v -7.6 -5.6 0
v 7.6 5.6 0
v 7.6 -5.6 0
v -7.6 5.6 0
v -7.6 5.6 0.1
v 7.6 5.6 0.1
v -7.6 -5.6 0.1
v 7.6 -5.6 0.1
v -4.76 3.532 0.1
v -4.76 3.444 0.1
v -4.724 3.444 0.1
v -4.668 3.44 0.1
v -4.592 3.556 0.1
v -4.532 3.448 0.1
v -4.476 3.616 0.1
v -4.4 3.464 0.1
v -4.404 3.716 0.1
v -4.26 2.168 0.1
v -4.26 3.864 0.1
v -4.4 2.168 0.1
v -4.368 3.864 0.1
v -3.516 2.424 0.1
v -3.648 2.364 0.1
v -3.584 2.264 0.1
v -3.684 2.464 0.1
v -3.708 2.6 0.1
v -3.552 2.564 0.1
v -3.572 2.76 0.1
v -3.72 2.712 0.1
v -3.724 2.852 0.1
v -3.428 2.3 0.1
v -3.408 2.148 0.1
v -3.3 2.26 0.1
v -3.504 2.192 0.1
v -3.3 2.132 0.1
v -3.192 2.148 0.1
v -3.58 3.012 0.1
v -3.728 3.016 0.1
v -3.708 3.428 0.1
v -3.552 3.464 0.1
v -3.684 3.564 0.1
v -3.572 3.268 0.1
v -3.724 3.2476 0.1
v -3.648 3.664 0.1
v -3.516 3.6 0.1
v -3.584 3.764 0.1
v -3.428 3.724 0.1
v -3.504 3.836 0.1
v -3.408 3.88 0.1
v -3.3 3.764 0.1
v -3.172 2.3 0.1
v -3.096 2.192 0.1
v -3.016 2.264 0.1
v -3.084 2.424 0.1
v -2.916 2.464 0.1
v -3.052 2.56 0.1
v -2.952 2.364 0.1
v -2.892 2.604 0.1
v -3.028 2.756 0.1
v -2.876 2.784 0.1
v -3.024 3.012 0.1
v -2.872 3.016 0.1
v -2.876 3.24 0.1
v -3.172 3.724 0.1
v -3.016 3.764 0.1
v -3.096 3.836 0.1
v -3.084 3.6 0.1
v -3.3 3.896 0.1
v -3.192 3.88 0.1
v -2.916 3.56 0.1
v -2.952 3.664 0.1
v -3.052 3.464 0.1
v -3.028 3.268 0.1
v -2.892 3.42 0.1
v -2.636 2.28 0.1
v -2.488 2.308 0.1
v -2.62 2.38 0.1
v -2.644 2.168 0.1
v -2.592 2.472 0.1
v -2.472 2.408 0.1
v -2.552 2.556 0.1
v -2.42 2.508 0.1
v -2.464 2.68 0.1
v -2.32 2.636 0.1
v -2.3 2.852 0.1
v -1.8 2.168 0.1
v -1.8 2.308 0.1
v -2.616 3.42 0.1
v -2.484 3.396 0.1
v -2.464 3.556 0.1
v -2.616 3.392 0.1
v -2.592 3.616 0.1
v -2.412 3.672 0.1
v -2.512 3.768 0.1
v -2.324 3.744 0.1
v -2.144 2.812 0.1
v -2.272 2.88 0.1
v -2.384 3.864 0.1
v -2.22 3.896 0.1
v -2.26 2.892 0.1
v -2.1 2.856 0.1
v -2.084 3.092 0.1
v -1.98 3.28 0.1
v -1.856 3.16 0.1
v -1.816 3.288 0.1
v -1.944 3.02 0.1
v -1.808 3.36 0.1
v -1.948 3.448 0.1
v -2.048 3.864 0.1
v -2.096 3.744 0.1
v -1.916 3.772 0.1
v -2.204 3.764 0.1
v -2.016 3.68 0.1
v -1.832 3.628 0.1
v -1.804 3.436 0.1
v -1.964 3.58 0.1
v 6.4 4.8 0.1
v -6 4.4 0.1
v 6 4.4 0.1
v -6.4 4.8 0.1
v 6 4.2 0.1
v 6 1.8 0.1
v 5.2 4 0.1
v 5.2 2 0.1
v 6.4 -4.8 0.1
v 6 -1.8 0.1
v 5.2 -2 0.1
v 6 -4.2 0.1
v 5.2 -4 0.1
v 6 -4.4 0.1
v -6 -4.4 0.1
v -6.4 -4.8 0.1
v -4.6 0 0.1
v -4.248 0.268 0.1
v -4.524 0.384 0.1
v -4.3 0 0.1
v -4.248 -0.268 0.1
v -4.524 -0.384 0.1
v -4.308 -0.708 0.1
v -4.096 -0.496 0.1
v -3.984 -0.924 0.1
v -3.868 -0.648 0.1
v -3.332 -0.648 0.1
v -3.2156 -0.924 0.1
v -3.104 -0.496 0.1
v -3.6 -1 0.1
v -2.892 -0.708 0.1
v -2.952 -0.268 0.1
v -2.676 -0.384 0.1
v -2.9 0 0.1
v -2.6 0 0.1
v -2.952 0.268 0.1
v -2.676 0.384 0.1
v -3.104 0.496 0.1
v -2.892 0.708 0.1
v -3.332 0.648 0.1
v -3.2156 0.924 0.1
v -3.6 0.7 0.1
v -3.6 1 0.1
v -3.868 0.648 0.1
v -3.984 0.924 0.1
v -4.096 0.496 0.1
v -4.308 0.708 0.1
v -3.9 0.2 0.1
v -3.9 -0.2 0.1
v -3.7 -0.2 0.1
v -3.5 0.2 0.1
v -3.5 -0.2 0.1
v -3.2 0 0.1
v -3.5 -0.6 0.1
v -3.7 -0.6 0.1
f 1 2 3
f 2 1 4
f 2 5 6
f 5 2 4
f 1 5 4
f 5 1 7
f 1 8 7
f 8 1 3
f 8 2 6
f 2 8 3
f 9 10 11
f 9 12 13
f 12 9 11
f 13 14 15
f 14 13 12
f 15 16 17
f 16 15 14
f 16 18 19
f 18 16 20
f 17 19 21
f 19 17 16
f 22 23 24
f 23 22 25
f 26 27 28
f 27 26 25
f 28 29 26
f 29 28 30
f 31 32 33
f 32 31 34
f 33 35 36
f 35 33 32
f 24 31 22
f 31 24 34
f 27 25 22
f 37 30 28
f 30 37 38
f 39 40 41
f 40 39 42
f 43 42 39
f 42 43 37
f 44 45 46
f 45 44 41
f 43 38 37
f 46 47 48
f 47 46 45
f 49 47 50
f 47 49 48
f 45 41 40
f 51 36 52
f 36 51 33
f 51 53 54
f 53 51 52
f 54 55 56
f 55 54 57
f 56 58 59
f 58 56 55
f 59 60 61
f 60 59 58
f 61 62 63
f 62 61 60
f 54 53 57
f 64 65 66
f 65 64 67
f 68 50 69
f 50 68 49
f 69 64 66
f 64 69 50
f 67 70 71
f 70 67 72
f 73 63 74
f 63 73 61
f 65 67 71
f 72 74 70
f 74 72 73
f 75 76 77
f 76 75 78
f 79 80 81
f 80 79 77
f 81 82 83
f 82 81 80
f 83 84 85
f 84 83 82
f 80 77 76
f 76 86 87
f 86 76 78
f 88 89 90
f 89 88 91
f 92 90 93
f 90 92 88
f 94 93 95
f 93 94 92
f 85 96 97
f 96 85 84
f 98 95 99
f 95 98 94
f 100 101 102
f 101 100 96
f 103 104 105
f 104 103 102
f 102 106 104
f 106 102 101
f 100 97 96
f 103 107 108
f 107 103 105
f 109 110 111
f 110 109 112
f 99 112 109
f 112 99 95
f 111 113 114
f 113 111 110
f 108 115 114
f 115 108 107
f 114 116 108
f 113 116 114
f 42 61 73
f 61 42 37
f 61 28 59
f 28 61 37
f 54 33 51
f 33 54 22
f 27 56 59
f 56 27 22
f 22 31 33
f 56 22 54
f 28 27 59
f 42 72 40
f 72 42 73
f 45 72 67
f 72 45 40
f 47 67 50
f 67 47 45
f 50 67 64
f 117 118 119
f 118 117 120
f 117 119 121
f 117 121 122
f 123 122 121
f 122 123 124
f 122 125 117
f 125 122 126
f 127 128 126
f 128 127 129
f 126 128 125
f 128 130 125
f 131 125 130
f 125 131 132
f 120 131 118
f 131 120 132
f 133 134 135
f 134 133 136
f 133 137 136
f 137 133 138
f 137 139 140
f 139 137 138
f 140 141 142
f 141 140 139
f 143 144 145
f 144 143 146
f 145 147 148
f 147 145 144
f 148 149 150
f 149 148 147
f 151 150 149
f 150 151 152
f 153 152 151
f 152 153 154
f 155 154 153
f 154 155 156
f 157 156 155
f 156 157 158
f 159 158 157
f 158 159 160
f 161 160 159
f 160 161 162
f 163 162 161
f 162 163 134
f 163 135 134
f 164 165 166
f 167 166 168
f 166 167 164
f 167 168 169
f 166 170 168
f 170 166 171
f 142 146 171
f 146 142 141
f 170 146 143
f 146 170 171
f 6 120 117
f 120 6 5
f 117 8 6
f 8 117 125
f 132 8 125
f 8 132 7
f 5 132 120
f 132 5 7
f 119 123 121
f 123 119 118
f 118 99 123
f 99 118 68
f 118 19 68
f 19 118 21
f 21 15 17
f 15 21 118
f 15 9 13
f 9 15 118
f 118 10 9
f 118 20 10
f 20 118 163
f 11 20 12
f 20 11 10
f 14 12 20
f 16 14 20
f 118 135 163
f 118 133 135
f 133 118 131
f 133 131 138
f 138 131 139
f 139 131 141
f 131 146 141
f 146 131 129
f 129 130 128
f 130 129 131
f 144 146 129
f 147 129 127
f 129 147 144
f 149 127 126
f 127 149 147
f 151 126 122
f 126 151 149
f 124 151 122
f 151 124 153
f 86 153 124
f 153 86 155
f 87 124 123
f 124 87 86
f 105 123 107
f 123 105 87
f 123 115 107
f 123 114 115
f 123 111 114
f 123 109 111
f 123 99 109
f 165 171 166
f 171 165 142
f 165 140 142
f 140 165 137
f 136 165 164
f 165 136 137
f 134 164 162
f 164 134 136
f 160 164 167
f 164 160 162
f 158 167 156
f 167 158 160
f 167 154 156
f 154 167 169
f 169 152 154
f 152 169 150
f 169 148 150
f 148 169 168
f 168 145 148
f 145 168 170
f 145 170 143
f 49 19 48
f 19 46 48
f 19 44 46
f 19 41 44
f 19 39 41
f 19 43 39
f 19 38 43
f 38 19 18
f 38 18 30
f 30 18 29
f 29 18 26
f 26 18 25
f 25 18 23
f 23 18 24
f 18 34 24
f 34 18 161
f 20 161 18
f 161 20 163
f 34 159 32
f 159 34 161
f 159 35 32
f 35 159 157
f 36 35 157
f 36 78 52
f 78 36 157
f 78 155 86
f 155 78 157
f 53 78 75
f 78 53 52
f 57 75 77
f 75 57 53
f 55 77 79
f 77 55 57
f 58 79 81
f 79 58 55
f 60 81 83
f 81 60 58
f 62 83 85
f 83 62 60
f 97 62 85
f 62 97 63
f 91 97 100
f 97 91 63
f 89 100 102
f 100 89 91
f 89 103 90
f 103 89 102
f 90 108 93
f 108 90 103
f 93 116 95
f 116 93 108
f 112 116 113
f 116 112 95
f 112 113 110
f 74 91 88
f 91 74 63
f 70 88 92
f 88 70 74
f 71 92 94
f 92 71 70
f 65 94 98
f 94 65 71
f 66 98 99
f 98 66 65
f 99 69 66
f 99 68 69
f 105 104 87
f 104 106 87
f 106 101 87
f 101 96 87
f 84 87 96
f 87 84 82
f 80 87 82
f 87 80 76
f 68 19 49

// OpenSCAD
// file: ../p/box5-12.scad
use <../lib.scad>
function ldraw_lib__box5_12() = [
// 0 Box with 5 Faces without Any Edges
// 0 Name: box5-12.dat
// 0 Author: Chris Dee [cwdee]
// 0 !LDRAW_ORG Primitive UPDATE 2009-02
// 0 !LICENSE Licensed under CC BY 4.0 : see CAreadme.txt
// 
// 0 BFC CERTIFY CCW
  [0,"BFC","CERTIFY"],
  [0,"BFC","CCW"],
// 
// 0 !HISTORY 2009-09-03 [PTadmin] Official Update 2009-02
// 
// 
// 4 16 1 1 1 1 1 -1 -1 1 -1 -1 1 1
  [4,16,1,1,1,1,1,-1,-1,1,-1,-1,1,1],
// 4 16 -1 0 1 1 0 1 1 1 1 -1 1 1
  [4,16,-1,0,1,1,0,1,1,1,1,-1,1,1],
// 4 16 -1 0 -1 -1 0 1 -1 1 1 -1 1 -1
  [4,16,-1,0,-1,-1,0,1,-1,1,1,-1,1,-1],
// 4 16 1 0 -1 -1 0 -1 -1 1 -1 1 1 -1
  [4,16,1,0,-1,-1,0,-1,-1,1,-1,1,1,-1],
// 4 16 1 0 1 1 0 -1 1 1 -1 1 1 1
  [4,16,1,0,1,1,0,-1,1,1,-1,1,1,1],
// 0
];
module ldraw_lib__box5_12(step=0, col=false, unit=2/5, alt=false, line=0.2, solid=!$preview)
    makepoly(ldraw_lib__box5_12(), step=step, col=col, unit=unit, alt=alt, line=line, solid=solid);
ldraw_lib__box5_12(line=0.2);
// main file
use <../lib.scad>
use <../p/box5-12.scad>
function ldraw_lib__163156b() = [
// 0 Sticker  1.4 x  1.9 with Town Airport Lockers - 102 Lock
// 0 Name: 163156b.dat
// 0 Author: Takeshi Takahashi [RainbowDolphin]
// 0 !LDRAW_ORG Part UPDATE 2020-03
// 0 !LICENSE Licensed under CC BY 4.0 : see CAreadme.txt
// 
// 0 BFC CERTIFY CCW
  [0,"BFC","CERTIFY"],
  [0,"BFC","CCW"],
// 
// 0 !KEYWORDS set 6396
// 
// 0 !HISTORY 2018-01-08 [bercik] OMR version by Robert Paciorek [bercik] with permission of Zoltank82
// 0 !HISTORY 2020-06-24 [RainbowDolphin] File preparation for LDraw Parts Tracker
// 0 !HISTORY 2020-12-29 [PTadmin] Official Update 2020-03
// 
// 
// 1 16 0 -0.25 0 19 0 0 0 0.25 0 0 0 14 box5-12.dat
  [1,16,0,-0.25,0,19,0,0,0,0.25,0,0,0,14, ldraw_lib__box5_12()],
// 3 0 -11.9 -0.25 8.83 -11.9 -0.25 8.61 -11.81 -0.25 8.61
  [3,0,-11.9,-0.25,8.83,-11.9,-0.25,8.61,-11.81,-0.25,8.61],
// 4 0 -11.9 -0.25 8.83 -11.81 -0.25 8.61 -11.67 -0.25 8.6 -11.48 -0.25 8.89
  [4,0,-11.9,-0.25,8.83,-11.81,-0.25,8.61,-11.67,-0.25,8.6,-11.48,-0.25,8.89],
// 4 0 -11.48 -0.25 8.89 -11.67 -0.25 8.6 -11.33 -0.25 8.62 -11.19 -0.25 9.04
  [4,0,-11.48,-0.25,8.89,-11.67,-0.25,8.6,-11.33,-0.25,8.62,-11.19,-0.25,9.04],
// 4 0 -11.19 -0.25 9.04 -11.33 -0.25 8.62 -11 -0.25 8.66 -11.01 -0.25 9.29
  [4,0,-11.19,-0.25,9.04,-11.33,-0.25,8.62,-11,-0.25,8.66,-11.01,-0.25,9.29],
// 4 0 -11 -0.25 8.66 -11 -0.25 5.42 -10.65 -0.25 5.42 -10.65 -0.25 9.66
  [4,0,-11,-0.25,8.66,-11,-0.25,5.42,-10.65,-0.25,5.42,-10.65,-0.25,9.66],
// 4 0 -11.01 -0.25 9.29 -11 -0.25 8.66 -10.65 -0.25 9.66 -10.92 -0.25 9.66
  [4,0,-11.01,-0.25,9.29,-11,-0.25,8.66,-10.65,-0.25,9.66,-10.92,-0.25,9.66],
// 4 0 -8.79 -0.25 6.06 -9.21 -0.25 6.16 -9.12 -0.25 5.91 -8.96 -0.25 5.66
  [4,0,-8.79,-0.25,6.06,-9.21,-0.25,6.16,-9.12,-0.25,5.91,-8.96,-0.25,5.66],
// 4 0 -9.27 -0.25 6.5 -9.21 -0.25 6.16 -8.88 -0.25 6.41 -8.93 -0.25 6.9
  [4,0,-9.27,-0.25,6.5,-9.21,-0.25,6.16,-8.88,-0.25,6.41,-8.93,-0.25,6.9],
// 4 0 -9.3 -0.25 6.78 -9.27 -0.25 6.5 -8.93 -0.25 6.9 -9.31 -0.25 7.13
  [4,0,-9.3,-0.25,6.78,-9.27,-0.25,6.5,-8.93,-0.25,6.9,-9.31,-0.25,7.13],
// 4 0 -8.57 -0.25 5.75 -8.76 -0.25 5.48 -8.52 -0.25 5.37 -8.25 -0.25 5.65
  [4,0,-8.57,-0.25,5.75,-8.76,-0.25,5.48,-8.52,-0.25,5.37,-8.25,-0.25,5.65],
// 4 0 -8.25 -0.25 5.65 -8.52 -0.25 5.37 -8.25 -0.25 5.33 -7.98 -0.25 5.37
  [4,0,-8.25,-0.25,5.65,-8.52,-0.25,5.37,-8.25,-0.25,5.33,-7.98,-0.25,5.37],
// 4 0 -8.57 -0.25 5.75 -8.79 -0.25 6.06 -8.96 -0.25 5.66 -8.76 -0.25 5.48
  [4,0,-8.57,-0.25,5.75,-8.79,-0.25,6.06,-8.96,-0.25,5.66,-8.76,-0.25,5.48],
// 3 0 -8.88 -0.25 6.41 -9.21 -0.25 6.16 -8.79 -0.25 6.06
  [3,0,-8.88,-0.25,6.41,-9.21,-0.25,6.16,-8.79,-0.25,6.06],
// 4 0 -9.31 -0.25 7.13 -8.93 -0.25 6.9 -8.95 -0.25 7.53 -9.32 -0.25 7.54
  [4,0,-9.31,-0.25,7.13,-8.93,-0.25,6.9,-8.95,-0.25,7.53,-9.32,-0.25,7.54],
// 4 0 -8.88 -0.25 8.66 -9.21 -0.25 8.91 -9.27 -0.25 8.57 -8.93 -0.25 8.17
  [4,0,-8.88,-0.25,8.66,-9.21,-0.25,8.91,-9.27,-0.25,8.57,-8.93,-0.25,8.17],
// 4 0 -8.93 -0.25 8.17 -9.27 -0.25 8.57 -9.31 -0.25 8.119 -8.95 -0.25 7.53
  [4,0,-8.93,-0.25,8.17,-9.27,-0.25,8.57,-9.31,-0.25,8.119,-8.95,-0.25,7.53],
// 4 0 -8.79 -0.25 9 -8.96 -0.25 9.41 -9.12 -0.25 9.16 -9.21 -0.25 8.91
  [4,0,-8.79,-0.25,9,-8.96,-0.25,9.41,-9.12,-0.25,9.16,-9.21,-0.25,8.91],
// 3 0 -9.31 -0.25 8.119 -9.32 -0.25 7.54 -8.95 -0.25 7.53
  [3,0,-9.31,-0.25,8.119,-9.32,-0.25,7.54,-8.95,-0.25,7.53],
// 4 0 -8.96 -0.25 9.41 -8.79 -0.25 9 -8.57 -0.25 9.31 -8.76 -0.25 9.59
  [4,0,-8.96,-0.25,9.41,-8.79,-0.25,9,-8.57,-0.25,9.31,-8.76,-0.25,9.59],
// 4 0 -8.52 -0.25 9.7 -8.76 -0.25 9.59 -8.57 -0.25 9.31 -8.25 -0.25 9.41
  [4,0,-8.52,-0.25,9.7,-8.76,-0.25,9.59,-8.57,-0.25,9.31,-8.25,-0.25,9.41],
// 3 0 -8.79 -0.25 9 -9.21 -0.25 8.91 -8.88 -0.25 8.66
  [3,0,-8.79,-0.25,9,-9.21,-0.25,8.91,-8.88,-0.25,8.66],
// 4 0 -7.93 -0.25 5.75 -8.25 -0.25 5.65 -7.98 -0.25 5.37 -7.74 -0.25 5.48
  [4,0,-7.93,-0.25,5.75,-8.25,-0.25,5.65,-7.98,-0.25,5.37,-7.74,-0.25,5.48],
// 4 0 -7.54 -0.25 5.66 -7.71 -0.25 6.06 -7.93 -0.25 5.75 -7.74 -0.25 5.48
  [4,0,-7.54,-0.25,5.66,-7.71,-0.25,6.06,-7.93,-0.25,5.75,-7.74,-0.25,5.48],
// 4 0 -7.29 -0.25 6.16 -7.63 -0.25 6.4 -7.71 -0.25 6.06 -7.38 -0.25 5.91
  [4,0,-7.29,-0.25,6.16,-7.63,-0.25,6.4,-7.71,-0.25,6.06,-7.38,-0.25,5.91],
// 4 0 -7.63 -0.25 6.4 -7.29 -0.25 6.16 -7.23 -0.25 6.51 -7.57 -0.25 6.89
  [4,0,-7.63,-0.25,6.4,-7.29,-0.25,6.16,-7.23,-0.25,6.51,-7.57,-0.25,6.89],
// 4 0 -7.19 -0.25 6.96 -7.56 -0.25 7.53 -7.57 -0.25 6.89 -7.23 -0.25 6.51
  [4,0,-7.19,-0.25,6.96,-7.56,-0.25,7.53,-7.57,-0.25,6.89,-7.23,-0.25,6.51],
// 4 0 -7.56 -0.25 7.53 -7.19 -0.25 6.96 -7.18 -0.25 7.54 -7.19 -0.25 8.1
  [4,0,-7.56,-0.25,7.53,-7.19,-0.25,6.96,-7.18,-0.25,7.54,-7.19,-0.25,8.1],
// 3 0 -7.71 -0.25 6.06 -7.54 -0.25 5.66 -7.38 -0.25 5.91
  [3,0,-7.71,-0.25,6.06,-7.54,-0.25,5.66,-7.38,-0.25,5.91],
// 4 0 -7.93 -0.25 9.31 -7.71 -0.25 9 -7.54 -0.25 9.41 -7.74 -0.25 9.59
  [4,0,-7.93,-0.25,9.31,-7.71,-0.25,9,-7.54,-0.25,9.41,-7.74,-0.25,9.59],
// 4 0 -8.25 -0.25 9.74 -8.52 -0.25 9.7 -8.25 -0.25 9.41 -7.98 -0.25 9.7
  [4,0,-8.25,-0.25,9.74,-8.52,-0.25,9.7,-8.25,-0.25,9.41,-7.98,-0.25,9.7],
// 4 0 -7.98 -0.25 9.7 -8.25 -0.25 9.41 -7.93 -0.25 9.31 -7.74 -0.25 9.59
  [4,0,-7.98,-0.25,9.7,-8.25,-0.25,9.41,-7.93,-0.25,9.31,-7.74,-0.25,9.59],
// 4 0 -7.71 -0.25 9 -7.63 -0.25 8.66 -7.29 -0.25 8.9 -7.38 -0.25 9.16
  [4,0,-7.71,-0.25,9,-7.63,-0.25,8.66,-7.29,-0.25,8.9,-7.38,-0.25,9.16],
// 4 0 -7.57 -0.25 8.17 -7.56 -0.25 7.53 -7.19 -0.25 8.1 -7.23 -0.25 8.55
  [4,0,-7.57,-0.25,8.17,-7.56,-0.25,7.53,-7.19,-0.25,8.1,-7.23,-0.25,8.55],
// 3 0 -7.54 -0.25 9.41 -7.71 -0.25 9 -7.38 -0.25 9.16
  [3,0,-7.54,-0.25,9.41,-7.71,-0.25,9,-7.38,-0.25,9.16],
// 4 0 -7.23 -0.25 8.55 -7.29 -0.25 8.9 -7.63 -0.25 8.66 -7.57 -0.25 8.17
  [4,0,-7.23,-0.25,8.55,-7.29,-0.25,8.9,-7.63,-0.25,8.66,-7.57,-0.25,8.17],
// 4 0 -6.22 -0.25 5.77 -6.55 -0.25 5.95 -6.59 -0.25 5.7 -6.61 -0.25 5.42
  [4,0,-6.22,-0.25,5.77,-6.55,-0.25,5.95,-6.59,-0.25,5.7,-6.61,-0.25,5.42],
// 4 0 -6.18 -0.25 6.02 -6.38 -0.25 6.39 -6.48 -0.25 6.18 -6.55 -0.25 5.95
  [4,0,-6.18,-0.25,6.02,-6.38,-0.25,6.39,-6.48,-0.25,6.18,-6.55,-0.25,5.95],
// 4 0 -6.38 -0.25 6.39 -6.18 -0.25 6.02 -6.05 -0.25 6.27 -6.16 -0.25 6.7
  [4,0,-6.38,-0.25,6.39,-6.18,-0.25,6.02,-6.05,-0.25,6.27,-6.16,-0.25,6.7],
// 4 0 -6.16 -0.25 6.7 -6.05 -0.25 6.27 -5.8 -0.25 6.59 -5.75 -0.25 7.13
  [4,0,-6.16,-0.25,6.7,-6.05,-0.25,6.27,-5.8,-0.25,6.59,-5.75,-0.25,7.13],
// 3 0 -6.18 -0.25 6.02 -6.55 -0.25 5.95 -6.22 -0.25 5.77
  [3,0,-6.18,-0.25,6.02,-6.55,-0.25,5.95,-6.22,-0.25,5.77],
// 4 0 -6.22 -0.25 5.77 -6.61 -0.25 5.42 -4.5 -0.25 5.42 -4.5 -0.25 5.77
  [4,0,-6.22,-0.25,5.77,-6.61,-0.25,5.42,-4.5,-0.25,5.42,-4.5,-0.25,5.77],
// 4 0 -6.54 -0.25 8.55 -6.54 -0.25 8.48 -6.21 -0.25 8.49 -6.16 -0.25 8.89
  [4,0,-6.54,-0.25,8.55,-6.54,-0.25,8.48,-6.21,-0.25,8.49,-6.16,-0.25,8.89],
// 4 0 -6.48 -0.25 9.04 -6.54 -0.25 8.55 -6.16 -0.25 8.89 -6.03 -0.25 9.18
  [4,0,-6.48,-0.25,9.04,-6.54,-0.25,8.55,-6.16,-0.25,8.89,-6.03,-0.25,9.18],
// 4 0 -6.28 -0.25 9.42 -6.48 -0.25 9.04 -6.03 -0.25 9.18 -5.81 -0.25 9.36
  [4,0,-6.28,-0.25,9.42,-6.48,-0.25,9.04,-6.03,-0.25,9.18,-5.81,-0.25,9.36],
// 4 0 -5.36 -0.25 7.03 -5.68 -0.25 7.2 -5.75 -0.25 7.13 -5.8 -0.25 6.59
  [4,0,-5.36,-0.25,7.03,-5.68,-0.25,7.2,-5.75,-0.25,7.13,-5.8,-0.25,6.59],
// 4 0 -5.96 -0.25 9.66 -6.28 -0.25 9.42 -5.81 -0.25 9.36 -5.55 -0.25 9.74
  [4,0,-5.96,-0.25,9.66,-6.28,-0.25,9.42,-5.81,-0.25,9.36,-5.55,-0.25,9.74],
// 4 0 -5.65 -0.25 7.23 -5.36 -0.25 7.03 -5.25 -0.25 7.14 -5.21 -0.25 7.73
  [4,0,-5.65,-0.25,7.23,-5.36,-0.25,7.03,-5.25,-0.25,7.14,-5.21,-0.25,7.73],
// 4 0 -4.95 -0.25 8.2 -5.21 -0.25 7.73 -4.64 -0.25 7.9 -4.54 -0.25 8.22
  [4,0,-4.95,-0.25,8.2,-5.21,-0.25,7.73,-4.64,-0.25,7.9,-4.54,-0.25,8.22],
// 4 0 -5.21 -0.25 7.73 -5.25 -0.25 7.14 -4.86 -0.25 7.55 -4.64 -0.25 7.9
  [4,0,-5.21,-0.25,7.73,-5.25,-0.25,7.14,-4.86,-0.25,7.55,-4.64,-0.25,7.9],
// 3 0 -5.65 -0.25 7.23 -5.68 -0.25 7.2 -5.36 -0.25 7.03
  [3,0,-5.65,-0.25,7.23,-5.68,-0.25,7.2,-5.36,-0.25,7.03],
// 4 0 -4.95 -0.25 8.2 -4.54 -0.25 8.22 -4.52 -0.25 8.4 -4.87 -0.25 8.62
  [4,0,-4.95,-0.25,8.2,-4.54,-0.25,8.22,-4.52,-0.25,8.4,-4.87,-0.25,8.62],
// 4 0 -5.24 -0.25 9.36 -4.79 -0.25 9.43 -5.12 -0.25 9.66 -5.51 -0.25 9.41
  [4,0,-5.24,-0.25,9.36,-4.79,-0.25,9.43,-5.12,-0.25,9.66,-5.51,-0.25,9.41],
// 4 0 -5.51 -0.25 9.41 -5.12 -0.25 9.66 -5.55 -0.25 9.74 -5.81 -0.25 9.36
  [4,0,-5.51,-0.25,9.41,-5.12,-0.25,9.66,-5.55,-0.25,9.74,-5.81,-0.25,9.36],
// 4 0 -4.79 -0.25 9.43 -5.24 -0.25 9.36 -5.04 -0.25 9.2 -4.58 -0.25 9.07
  [4,0,-4.79,-0.25,9.43,-5.24,-0.25,9.36,-5.04,-0.25,9.2,-4.58,-0.25,9.07],
// 4 0 -4.87 -0.25 8.62 -4.52 -0.25 8.4 -4.51 -0.25 8.59 -4.58 -0.25 9.07
  [4,0,-4.87,-0.25,8.62,-4.52,-0.25,8.4,-4.51,-0.25,8.59,-4.58,-0.25,9.07],
// 3 0 -4.58 -0.25 9.07 -4.91 -0.25 8.95 -4.87 -0.25 8.62
  [3,0,-4.58,-0.25,9.07,-4.91,-0.25,8.95,-4.87,-0.25,8.62],
// 3 0 -5.04 -0.25 9.2 -4.91 -0.25 8.95 -4.58 -0.25 9.07
  [3,0,-5.04,-0.25,9.2,-4.91,-0.25,8.95,-4.58,-0.25,9.07],
// 4 7 -7.56 -0.25 7.53 -7.57 -0.25 8.17 -8.93 -0.25 8.17 -8.95 -0.25 7.53
  [4,7,-7.56,-0.25,7.53,-7.57,-0.25,8.17,-8.93,-0.25,8.17,-8.95,-0.25,7.53],
// 4 7 -7.56 -0.25 7.53 -8.95 -0.25 7.53 -8.93 -0.25 6.9 -7.57 -0.25 6.89
  [4,7,-7.56,-0.25,7.53,-8.95,-0.25,7.53,-8.93,-0.25,6.9,-7.57,-0.25,6.89],
// 4 7 -8.25 -0.25 5.65 -7.93 -0.25 5.75 -7.71 -0.25 6.06 -8.79 -0.25 6.06
  [4,7,-8.25,-0.25,5.65,-7.93,-0.25,5.75,-7.71,-0.25,6.06,-8.79,-0.25,6.06],
// 4 7 -8.88 -0.25 6.41 -8.79 -0.25 6.06 -7.63 -0.25 6.4 -7.57 -0.25 6.89
  [4,7,-8.88,-0.25,6.41,-8.79,-0.25,6.06,-7.63,-0.25,6.4,-7.57,-0.25,6.89],
// 3 7 -8.79 -0.25 6.06 -8.57 -0.25 5.75 -8.25 -0.25 5.65
  [3,7,-8.79,-0.25,6.06,-8.57,-0.25,5.75,-8.25,-0.25,5.65],
// 3 7 -7.63 -0.25 6.4 -8.79 -0.25 6.06 -7.71 -0.25 6.06
  [3,7,-7.63,-0.25,6.4,-8.79,-0.25,6.06,-7.71,-0.25,6.06],
// 3 7 -8.93 -0.25 6.9 -8.88 -0.25 6.41 -7.57 -0.25 6.89
  [3,7,-8.93,-0.25,6.9,-8.88,-0.25,6.41,-7.57,-0.25,6.89],
// 4 7 -8.88 -0.25 8.66 -8.93 -0.25 8.17 -7.57 -0.25 8.17 -7.63 -0.25 8.66
  [4,7,-8.88,-0.25,8.66,-8.93,-0.25,8.17,-7.57,-0.25,8.17,-7.63,-0.25,8.66],
// 4 7 -8.79 -0.25 9 -8.88 -0.25 8.66 -7.63 -0.25 8.66 -7.71 -0.25 9
  [4,7,-8.79,-0.25,9,-8.88,-0.25,8.66,-7.63,-0.25,8.66,-7.71,-0.25,9],
// 4 7 -8.25 -0.25 9.41 -8.57 -0.25 9.31 -8.79 -0.25 9 -7.71 -0.25 9
  [4,7,-8.25,-0.25,9.41,-8.57,-0.25,9.31,-8.79,-0.25,9,-7.71,-0.25,9],
// 3 7 -8.25 -0.25 9.41 -7.71 -0.25 9 -7.93 -0.25 9.31
  [3,7,-8.25,-0.25,9.41,-7.71,-0.25,9,-7.93,-0.25,9.31],
// 4 0 -16 -0.25 12 -15 -0.25 11 15 -0.25 11 16 -0.25 12
  [4,0,-16,-0.25,12,-15,-0.25,11,15,-0.25,11,16,-0.25,12],
// 3 0 16 -0.25 12 15 -0.25 11 15 -0.25 10.5
  [3,0,16,-0.25,12,15,-0.25,11,15,-0.25,10.5],
// 3 0 16 -0.25 12 15 -0.25 10.5 15 -0.25 4.5
  [3,0,16,-0.25,12,15,-0.25,10.5,15,-0.25,4.5],
// 4 0 15 -0.25 4.5 15 -0.25 10.5 13 -0.25 10 13 -0.25 5
  [4,0,15,-0.25,4.5,15,-0.25,10.5,13,-0.25,10,13,-0.25,5],
// 4 0 16 -0.25 12 15 -0.25 4.5 15 -0.25 -4.5 16 -0.25 -12
  [4,0,16,-0.25,12,15,-0.25,4.5,15,-0.25,-4.5,16,-0.25,-12],
// 4 0 15 -0.25 -4.5 13 -0.25 -5 13 -0.25 -10 15 -0.25 -10.5
  [4,0,15,-0.25,-4.5,13,-0.25,-5,13,-0.25,-10,15,-0.25,-10.5],
// 3 0 15 -0.25 -4.5 15 -0.25 -10.5 16 -0.25 -12
  [3,0,15,-0.25,-4.5,15,-0.25,-10.5,16,-0.25,-12],
// 3 0 15 -0.25 -10.5 15 -0.25 -11 16 -0.25 -12
  [3,0,15,-0.25,-10.5,15,-0.25,-11,16,-0.25,-12],
// 4 0 -16 -0.25 -12 16 -0.25 -12 15 -0.25 -11 -15 -0.25 -11
  [4,0,-16,-0.25,-12,16,-0.25,-12,15,-0.25,-11,-15,-0.25,-11],
// 4 0 -15 -0.25 -11 -15 -0.25 11 -16 -0.25 12 -16 -0.25 -12
  [4,0,-15,-0.25,-11,-15,-0.25,11,-16,-0.25,12,-16,-0.25,-12],
// 4 0 -10.75 -0.25 0 -10.62 -0.25 0.67 -11.31 -0.25 0.96 -11.5 -0.25 0
  [4,0,-10.75,-0.25,0,-10.62,-0.25,0.67,-11.31,-0.25,0.96,-11.5,-0.25,0],
// 4 0 -10.62 -0.25 -0.67 -10.75 -0.25 0 -11.5 -0.25 0 -11.31 -0.25 -0.96
  [4,0,-10.62,-0.25,-0.67,-10.75,-0.25,0,-11.5,-0.25,0,-11.31,-0.25,-0.96],
// 4 0 -10.24 -0.25 -1.24 -10.62 -0.25 -0.67 -11.31 -0.25 -0.96 -10.77 -0.25 -1.77
  [4,0,-10.24,-0.25,-1.24,-10.62,-0.25,-0.67,-11.31,-0.25,-0.96,-10.77,-0.25,-1.77],
// 4 0 -9.67 -0.25 -1.62 -10.24 -0.25 -1.24 -10.77 -0.25 -1.77 -9.96 -0.25 -2.31
  [4,0,-9.67,-0.25,-1.62,-10.24,-0.25,-1.24,-10.77,-0.25,-1.77,-9.96,-0.25,-2.31],
// 4 0 -8.33 -0.25 -1.62 -9 -0.25 -2.5 -8.039 -0.25 -2.31 -7.76 -0.25 -1.24
  [4,0,-8.33,-0.25,-1.62,-9,-0.25,-2.5,-8.039,-0.25,-2.31,-7.76,-0.25,-1.24],
// 4 0 -7.76 -0.25 -1.24 -8.039 -0.25 -2.31 -7.23 -0.25 -1.77 -7.38 -0.25 -0.67
  [4,0,-7.76,-0.25,-1.24,-8.039,-0.25,-2.31,-7.23,-0.25,-1.77,-7.38,-0.25,-0.67],
// 4 0 -7.38 -0.25 -0.67 -7.23 -0.25 -1.77 -6.69 -0.25 -0.96 -7.25 -0.25 0
  [4,0,-7.38,-0.25,-0.67,-7.23,-0.25,-1.77,-6.69,-0.25,-0.96,-7.25,-0.25,0],
// 4 0 -7.25 -0.25 0 -6.69 -0.25 -0.96 -6.5 -0.25 0 -7.38 -0.25 0.67
  [4,0,-7.25,-0.25,0,-6.69,-0.25,-0.96,-6.5,-0.25,0,-7.38,-0.25,0.67],
// 4 0 -7.38 -0.25 0.67 -6.5 -0.25 0 -6.69 -0.25 0.96 -7.76 -0.25 1.24
  [4,0,-7.38,-0.25,0.67,-6.5,-0.25,0,-6.69,-0.25,0.96,-7.76,-0.25,1.24],
// 4 0 -7.76 -0.25 1.24 -6.69 -0.25 0.96 -7.23 -0.25 1.77 -8.33 -0.25 1.62
  [4,0,-7.76,-0.25,1.24,-6.69,-0.25,0.96,-7.23,-0.25,1.77,-8.33,-0.25,1.62],
// 4 0 -8.33 -0.25 1.62 -7.23 -0.25 1.77 -8.039 -0.25 2.31 -9 -0.25 1.75
  [4,0,-8.33,-0.25,1.62,-7.23,-0.25,1.77,-8.039,-0.25,2.31,-9,-0.25,1.75],
// 4 0 -9 -0.25 1.75 -8.039 -0.25 2.31 -9 -0.25 2.5 -9.67 -0.25 1.62
  [4,0,-9,-0.25,1.75,-8.039,-0.25,2.31,-9,-0.25,2.5,-9.67,-0.25,1.62],
// 4 0 -9.67 -0.25 1.62 -9 -0.25 2.5 -9.96 -0.25 2.31 -10.24 -0.25 1.24
  [4,0,-9.67,-0.25,1.62,-9,-0.25,2.5,-9.96,-0.25,2.31,-10.24,-0.25,1.24],
// 4 0 -10.24 -0.25 1.24 -9.96 -0.25 2.31 -10.77 -0.25 1.77 -10.62 -0.25 0.67
  [4,0,-10.24,-0.25,1.24,-9.96,-0.25,2.31,-10.77,-0.25,1.77,-10.62,-0.25,0.67],
// 3 0 -10.77 -0.25 1.77 -11.31 -0.25 0.96 -10.62 -0.25 0.67
  [3,0,-10.77,-0.25,1.77,-11.31,-0.25,0.96,-10.62,-0.25,0.67],
// 3 0 -9.75 -0.25 0.5 -9.75 -0.25 -0.5 -9.25 -0.25 -0.5
  [3,0,-9.75,-0.25,0.5,-9.75,-0.25,-0.5,-9.25,-0.25,-0.5],
// 4 0 -9.75 -0.25 0.5 -9.25 -0.25 -0.5 -8.75 -0.25 -0.5 -8.75 -0.25 0.5
  [4,0,-9.75,-0.25,0.5,-9.25,-0.25,-0.5,-8.75,-0.25,-0.5,-8.75,-0.25,0.5],
// 3 0 -8.75 -0.25 0.5 -8.75 -0.25 -0.5 -8 -0.25 0
  [3,0,-8.75,-0.25,0.5,-8.75,-0.25,-0.5,-8,-0.25,0],
// 4 0 -8.75 -0.25 -0.5 -9.25 -0.25 -0.5 -9.25 -0.25 -1.5 -8.75 -0.25 -1.5
  [4,0,-8.75,-0.25,-0.5,-9.25,-0.25,-0.5,-9.25,-0.25,-1.5,-8.75,-0.25,-1.5],
// 4 0 -9.25 -0.25 -1.5 -9.67 -0.25 -1.62 -9.96 -0.25 -2.31 -9 -0.25 -2.5
  [4,0,-9.25,-0.25,-1.5,-9.67,-0.25,-1.62,-9.96,-0.25,-2.31,-9,-0.25,-2.5],
// 4 0 -8.75 -0.25 -1.5 -9.25 -0.25 -1.5 -9 -0.25 -2.5 -8.33 -0.25 -1.62
  [4,0,-8.75,-0.25,-1.5,-9.25,-0.25,-1.5,-9,-0.25,-2.5,-8.33,-0.25,-1.62],
// 4 16 19 -0.25 14 -19 -0.25 14 -16 -0.25 12 16 -0.25 12
  [4,16,19,-0.25,14,-19,-0.25,14,-16,-0.25,12,16,-0.25,12],
// 4 16 19 -0.25 -14 19 -0.25 14 16 -0.25 12 16 -0.25 -12
  [4,16,19,-0.25,-14,19,-0.25,14,16,-0.25,12,16,-0.25,-12],
// 4 16 -19 -0.25 -14 19 -0.25 -14 16 -0.25 -12 -16 -0.25 -12
  [4,16,-19,-0.25,-14,19,-0.25,-14,16,-0.25,-12,-16,-0.25,-12],
// 4 16 -19 -0.25 14 -19 -0.25 -14 -16 -0.25 -12 -16 -0.25 12
  [4,16,-19,-0.25,14,-19,-0.25,-14,-16,-0.25,-12,-16,-0.25,12],
// 4 7 15 -0.25 11 -15 -0.25 11 13 -0.25 10 15 -0.25 10.5
  [4,7,15,-0.25,11,-15,-0.25,11,13,-0.25,10,15,-0.25,10.5],
// 4 7 -5.55 -0.25 9.74 13 -0.25 10 -15 -0.25 11 -8.25 -0.25 9.74
  [4,7,-5.55,-0.25,9.74,13,-0.25,10,-15,-0.25,11,-8.25,-0.25,9.74],
// 4 7 -10.65 -0.25 9.66 -8.25 -0.25 9.74 -15 -0.25 11 -10.92 -0.25 9.66
  [4,7,-10.65,-0.25,9.66,-8.25,-0.25,9.74,-15,-0.25,11,-10.92,-0.25,9.66],
// 4 7 -11.01 -0.25 9.29 -10.92 -0.25 9.66 -15 -0.25 11 -11.19 -0.25 9.04
  [4,7,-11.01,-0.25,9.29,-10.92,-0.25,9.66,-15,-0.25,11,-11.19,-0.25,9.04],
// 4 7 -11.48 -0.25 8.89 -11.19 -0.25 9.04 -15 -0.25 11 -11.9 -0.25 8.83
  [4,7,-11.48,-0.25,8.89,-11.19,-0.25,9.04,-15,-0.25,11,-11.9,-0.25,8.83],
// 3 7 -15 -0.25 11 -11.9 -0.25 8.61 -11.9 -0.25 8.83
  [3,7,-15,-0.25,11,-11.9,-0.25,8.61,-11.9,-0.25,8.83],
// 4 7 -11 -0.25 5.42 -11.9 -0.25 8.61 -15 -0.25 11 -10.77 -0.25 1.77
  [4,7,-11,-0.25,5.42,-11.9,-0.25,8.61,-15,-0.25,11,-10.77,-0.25,1.77],
// 4 7 -11.81 -0.25 8.61 -11.9 -0.25 8.61 -11 -0.25 5.42 -11.67 -0.25 8.6
  [4,7,-11.81,-0.25,8.61,-11.9,-0.25,8.61,-11,-0.25,5.42,-11.67,-0.25,8.6],
// 3 7 -11.33 -0.25 8.62 -11.67 -0.25 8.6 -11 -0.25 5.42
  [3,7,-11.33,-0.25,8.62,-11.67,-0.25,8.6,-11,-0.25,5.42],
// 3 7 -11 -0.25 8.66 -11.33 -0.25 8.62 -11 -0.25 5.42
  [3,7,-11,-0.25,8.66,-11.33,-0.25,8.62,-11,-0.25,5.42],
// 3 7 -15 -0.25 11 -11.31 -0.25 0.96 -10.77 -0.25 1.77
  [3,7,-15,-0.25,11,-11.31,-0.25,0.96,-10.77,-0.25,1.77],
// 4 7 -11.5 -0.25 0 -11.31 -0.25 0.96 -15 -0.25 11 -15 -0.25 -11
  [4,7,-11.5,-0.25,0,-11.31,-0.25,0.96,-15,-0.25,11,-15,-0.25,-11],
// 3 7 -11.5 -0.25 0 -15 -0.25 -11 -11.31 -0.25 -0.96
  [3,7,-11.5,-0.25,0,-15,-0.25,-11,-11.31,-0.25,-0.96],
// 3 7 -11.31 -0.25 -0.96 -15 -0.25 -11 -10.77 -0.25 -1.77
  [3,7,-11.31,-0.25,-0.96,-15,-0.25,-11,-10.77,-0.25,-1.77],
// 3 7 -10.77 -0.25 -1.77 -15 -0.25 -11 -9.96 -0.25 -2.31
  [3,7,-10.77,-0.25,-1.77,-15,-0.25,-11,-9.96,-0.25,-2.31],
// 4 7 -9 -0.25 -2.5 -9.96 -0.25 -2.31 -15 -0.25 -11 13 -0.25 -10
  [4,7,-9,-0.25,-2.5,-9.96,-0.25,-2.31,-15,-0.25,-11,13,-0.25,-10],
// 4 7 13 -0.25 -10 -15 -0.25 -11 15 -0.25 -11 15 -0.25 -10.5
  [4,7,13,-0.25,-10,-15,-0.25,-11,15,-0.25,-11,15,-0.25,-10.5],
// 3 7 -8.039 -0.25 -2.31 -9 -0.25 -2.5 13 -0.25 -10
  [3,7,-8.039,-0.25,-2.31,-9,-0.25,-2.5,13,-0.25,-10],
// 4 7 -7.23 -0.25 -1.77 -8.039 -0.25 -2.31 13 -0.25 -10 13 -0.25 -5
  [4,7,-7.23,-0.25,-1.77,-8.039,-0.25,-2.31,13,-0.25,-10,13,-0.25,-5],
// 4 7 -6.69 -0.25 -0.96 -7.23 -0.25 -1.77 13 -0.25 -5 15 -0.25 -4.5
  [4,7,-6.69,-0.25,-0.96,-7.23,-0.25,-1.77,13,-0.25,-5,15,-0.25,-4.5],
// 4 7 -6.5 -0.25 0 -6.69 -0.25 -0.96 15 -0.25 -4.5 15 -0.25 4.5
  [4,7,-6.5,-0.25,0,-6.69,-0.25,-0.96,15,-0.25,-4.5,15,-0.25,4.5],
// 4 7 -6.69 -0.25 0.96 -6.5 -0.25 0 15 -0.25 4.5 13 -0.25 5
  [4,7,-6.69,-0.25,0.96,-6.5,-0.25,0,15,-0.25,4.5,13,-0.25,5],
// 4 7 -7.23 -0.25 1.77 -6.69 -0.25 0.96 13 -0.25 5 -4.5 -0.25 5.42
  [4,7,-7.23,-0.25,1.77,-6.69,-0.25,0.96,13,-0.25,5,-4.5,-0.25,5.42],
// 4 7 -4.5 -0.25 5.77 -4.5 -0.25 5.42 13 -0.25 5 13 -0.25 10
  [4,7,-4.5,-0.25,5.77,-4.5,-0.25,5.42,13,-0.25,5,13,-0.25,10],
// 4 7 -4.54 -0.25 8.22 -4.5 -0.25 5.77 13 -0.25 10 -4.52 -0.25 8.4
  [4,7,-4.54,-0.25,8.22,-4.5,-0.25,5.77,13,-0.25,10,-4.52,-0.25,8.4],
// 3 7 13 -0.25 10 -4.51 -0.25 8.59 -4.52 -0.25 8.4
  [3,7,13,-0.25,10,-4.51,-0.25,8.59,-4.52,-0.25,8.4],
// 3 7 13 -0.25 10 -4.58 -0.25 9.07 -4.51 -0.25 8.59
  [3,7,13,-0.25,10,-4.58,-0.25,9.07,-4.51,-0.25,8.59],
// 3 7 13 -0.25 10 -4.79 -0.25 9.43 -4.58 -0.25 9.07
  [3,7,13,-0.25,10,-4.79,-0.25,9.43,-4.58,-0.25,9.07],
// 3 7 13 -0.25 10 -5.12 -0.25 9.66 -4.79 -0.25 9.43
  [3,7,13,-0.25,10,-5.12,-0.25,9.66,-4.79,-0.25,9.43],
// 3 7 13 -0.25 10 -5.55 -0.25 9.74 -5.12 -0.25 9.66
  [3,7,13,-0.25,10,-5.55,-0.25,9.74,-5.12,-0.25,9.66],
// 4 7 -9.25 -0.25 -1.5 -9.25 -0.25 -0.5 -9.75 -0.25 -0.5 -9.67 -0.25 -1.62
  [4,7,-9.25,-0.25,-1.5,-9.25,-0.25,-0.5,-9.75,-0.25,-0.5,-9.67,-0.25,-1.62],
// 4 7 -10.24 -0.25 -1.24 -9.67 -0.25 -1.62 -9.75 -0.25 -0.5 -10.62 -0.25 -0.67
  [4,7,-10.24,-0.25,-1.24,-9.67,-0.25,-1.62,-9.75,-0.25,-0.5,-10.62,-0.25,-0.67],
// 4 7 -10.62 -0.25 -0.67 -9.75 -0.25 -0.5 -9.75 -0.25 0.5 -10.75 -0.25 0
  [4,7,-10.62,-0.25,-0.67,-9.75,-0.25,-0.5,-9.75,-0.25,0.5,-10.75,-0.25,0],
// 4 7 -10.62 -0.25 0.67 -10.75 -0.25 0 -9.75 -0.25 0.5 -10.24 -0.25 1.24
  [4,7,-10.62,-0.25,0.67,-10.75,-0.25,0,-9.75,-0.25,0.5,-10.24,-0.25,1.24],
// 4 7 -9.67 -0.25 1.62 -10.24 -0.25 1.24 -9.75 -0.25 0.5 -8.75 -0.25 0.5
  [4,7,-9.67,-0.25,1.62,-10.24,-0.25,1.24,-9.75,-0.25,0.5,-8.75,-0.25,0.5],
// 4 7 -9 -0.25 1.75 -9.67 -0.25 1.62 -8.75 -0.25 0.5 -8.33 -0.25 1.62
  [4,7,-9,-0.25,1.75,-9.67,-0.25,1.62,-8.75,-0.25,0.5,-8.33,-0.25,1.62],
// 4 7 -7.76 -0.25 1.24 -8.33 -0.25 1.62 -8.75 -0.25 0.5 -8 -0.25 0
  [4,7,-7.76,-0.25,1.24,-8.33,-0.25,1.62,-8.75,-0.25,0.5,-8,-0.25,0],
// 4 7 -7.38 -0.25 0.67 -7.76 -0.25 1.24 -8 -0.25 0 -7.25 -0.25 0
  [4,7,-7.38,-0.25,0.67,-7.76,-0.25,1.24,-8,-0.25,0,-7.25,-0.25,0],
// 4 7 -7.38 -0.25 -0.67 -7.25 -0.25 0 -8 -0.25 0 -8.75 -0.25 -0.5
  [4,7,-7.38,-0.25,-0.67,-7.25,-0.25,0,-8,-0.25,0,-8.75,-0.25,-0.5],
// 4 7 -7.76 -0.25 -1.24 -7.38 -0.25 -0.67 -8.75 -0.25 -0.5 -8.75 -0.25 -1.5
  [4,7,-7.76,-0.25,-1.24,-7.38,-0.25,-0.67,-8.75,-0.25,-0.5,-8.75,-0.25,-1.5],
// 3 7 -7.76 -0.25 -1.24 -8.75 -0.25 -1.5 -8.33 -0.25 -1.62
  [3,7,-7.76,-0.25,-1.24,-8.75,-0.25,-1.5,-8.33,-0.25,-1.62],
// 3 7 -8.52 -0.25 9.7 -10.65 -0.25 9.66 -8.76 -0.25 9.59
  [3,7,-8.52,-0.25,9.7,-10.65,-0.25,9.66,-8.76,-0.25,9.59],
// 3 7 -10.65 -0.25 9.66 -8.96 -0.25 9.41 -8.76 -0.25 9.59
  [3,7,-10.65,-0.25,9.66,-8.96,-0.25,9.41,-8.76,-0.25,9.59],
// 3 7 -10.65 -0.25 9.66 -9.12 -0.25 9.16 -8.96 -0.25 9.41
  [3,7,-10.65,-0.25,9.66,-9.12,-0.25,9.16,-8.96,-0.25,9.41],
// 3 7 -10.65 -0.25 9.66 -9.21 -0.25 8.91 -9.12 -0.25 9.16
  [3,7,-10.65,-0.25,9.66,-9.21,-0.25,8.91,-9.12,-0.25,9.16],
// 3 7 -10.65 -0.25 9.66 -9.27 -0.25 8.57 -9.21 -0.25 8.91
  [3,7,-10.65,-0.25,9.66,-9.27,-0.25,8.57,-9.21,-0.25,8.91],
// 3 7 -10.65 -0.25 9.66 -9.31 -0.25 8.119 -9.27 -0.25 8.57
  [3,7,-10.65,-0.25,9.66,-9.31,-0.25,8.119,-9.27,-0.25,8.57],
// 4 7 -9.32 -0.25 7.54 -9.31 -0.25 8.119 -10.65 -0.25 9.66 -10.65 -0.25 5.42
  [4,7,-9.32,-0.25,7.54,-9.31,-0.25,8.119,-10.65,-0.25,9.66,-10.65,-0.25,5.42],
// 3 7 -9.32 -0.25 7.54 -10.65 -0.25 5.42 -9.31 -0.25 7.13
  [3,7,-9.32,-0.25,7.54,-10.65,-0.25,5.42,-9.31,-0.25,7.13],
// 3 7 -9.31 -0.25 7.13 -10.65 -0.25 5.42 -9.3 -0.25 6.78
  [3,7,-9.31,-0.25,7.13,-10.65,-0.25,5.42,-9.3,-0.25,6.78],
// 3 7 -9.3 -0.25 6.78 -10.65 -0.25 5.42 -9.27 -0.25 6.5
  [3,7,-9.3,-0.25,6.78,-10.65,-0.25,5.42,-9.27,-0.25,6.5],
// 3 7 -9.27 -0.25 6.5 -10.65 -0.25 5.42 -9.21 -0.25 6.16
  [3,7,-9.27,-0.25,6.5,-10.65,-0.25,5.42,-9.21,-0.25,6.16],
// 3 7 -9.21 -0.25 6.16 -10.65 -0.25 5.42 -9.12 -0.25 5.91
  [3,7,-9.21,-0.25,6.16,-10.65,-0.25,5.42,-9.12,-0.25,5.91],
// 3 7 -9.12 -0.25 5.91 -10.65 -0.25 5.42 -8.96 -0.25 5.66
  [3,7,-9.12,-0.25,5.91,-10.65,-0.25,5.42,-8.96,-0.25,5.66],
// 4 7 -8.76 -0.25 5.48 -8.96 -0.25 5.66 -10.65 -0.25 5.42 -9.96 -0.25 2.31
  [4,7,-8.76,-0.25,5.48,-8.96,-0.25,5.66,-10.65,-0.25,5.42,-9.96,-0.25,2.31],
// 4 7 -9.96 -0.25 2.31 -10.65 -0.25 5.42 -11 -0.25 5.42 -10.77 -0.25 1.77
  [4,7,-9.96,-0.25,2.31,-10.65,-0.25,5.42,-11,-0.25,5.42,-10.77,-0.25,1.77],
// 4 7 -8.76 -0.25 5.48 -9.96 -0.25 2.31 -9 -0.25 2.5 -8.52 -0.25 5.37
  [4,7,-8.76,-0.25,5.48,-9.96,-0.25,2.31,-9,-0.25,2.5,-8.52,-0.25,5.37],
// 4 7 -8.25 -0.25 5.33 -8.52 -0.25 5.37 -9 -0.25 2.5 -8.039 -0.25 2.31
  [4,7,-8.25,-0.25,5.33,-8.52,-0.25,5.37,-9,-0.25,2.5,-8.039,-0.25,2.31],
// 3 7 -7.98 -0.25 5.37 -8.25 -0.25 5.33 -8.039 -0.25 2.31
  [3,7,-7.98,-0.25,5.37,-8.25,-0.25,5.33,-8.039,-0.25,2.31],
// 4 7 -7.74 -0.25 5.48 -7.98 -0.25 5.37 -8.039 -0.25 2.31 -6.61 -0.25 5.42
  [4,7,-7.74,-0.25,5.48,-7.98,-0.25,5.37,-8.039,-0.25,2.31,-6.61,-0.25,5.42],
// 4 7 -6.61 -0.25 5.42 -8.039 -0.25 2.31 -7.23 -0.25 1.77 -4.5 -0.25 5.42
  [4,7,-6.61,-0.25,5.42,-8.039,-0.25,2.31,-7.23,-0.25,1.77,-4.5,-0.25,5.42],
// 4 7 -7.54 -0.25 5.66 -7.74 -0.25 5.48 -6.61 -0.25 5.42 -6.59 -0.25 5.7
  [4,7,-7.54,-0.25,5.66,-7.74,-0.25,5.48,-6.61,-0.25,5.42,-6.59,-0.25,5.7],
// 4 7 -7.38 -0.25 5.91 -7.54 -0.25 5.66 -6.59 -0.25 5.7 -6.55 -0.25 5.95
  [4,7,-7.38,-0.25,5.91,-7.54,-0.25,5.66,-6.59,-0.25,5.7,-6.55,-0.25,5.95],
// 4 7 -7.29 -0.25 6.16 -7.38 -0.25 5.91 -6.55 -0.25 5.95 -6.48 -0.25 6.18
  [4,7,-7.29,-0.25,6.16,-7.38,-0.25,5.91,-6.55,-0.25,5.95,-6.48,-0.25,6.18],
// 4 7 -7.23 -0.25 6.51 -7.29 -0.25 6.16 -6.48 -0.25 6.18 -6.38 -0.25 6.39
  [4,7,-7.23,-0.25,6.51,-7.29,-0.25,6.16,-6.48,-0.25,6.18,-6.38,-0.25,6.39],
// 4 7 -7.19 -0.25 6.96 -7.23 -0.25 6.51 -6.38 -0.25 6.39 -6.16 -0.25 6.7
  [4,7,-7.19,-0.25,6.96,-7.23,-0.25,6.51,-6.38,-0.25,6.39,-6.16,-0.25,6.7],
// 4 7 -7.18 -0.25 7.54 -7.19 -0.25 6.96 -6.16 -0.25 6.7 -5.75 -0.25 7.13
  [4,7,-7.18,-0.25,7.54,-7.19,-0.25,6.96,-6.16,-0.25,6.7,-5.75,-0.25,7.13],
// 4 7 -7.18 -0.25 7.54 -5.75 -0.25 7.13 -5.68 -0.25 7.2 -7.19 -0.25 8.1
  [4,7,-7.18,-0.25,7.54,-5.75,-0.25,7.13,-5.68,-0.25,7.2,-7.19,-0.25,8.1],
// 4 7 -7.19 -0.25 8.1 -5.68 -0.25 7.2 -5.65 -0.25 7.23 -6.54 -0.25 8.48
  [4,7,-7.19,-0.25,8.1,-5.68,-0.25,7.2,-5.65,-0.25,7.23,-6.54,-0.25,8.48],
// 4 7 -6.21 -0.25 8.49 -6.54 -0.25 8.48 -5.65 -0.25 7.23 -5.21 -0.25 7.73
  [4,7,-6.21,-0.25,8.49,-6.54,-0.25,8.48,-5.65,-0.25,7.23,-5.21,-0.25,7.73],
// 4 7 -6.16 -0.25 8.89 -6.21 -0.25 8.49 -5.21 -0.25 7.73 -4.95 -0.25 8.2
  [4,7,-6.16,-0.25,8.89,-6.21,-0.25,8.49,-5.21,-0.25,7.73,-4.95,-0.25,8.2],
// 4 7 -6.03 -0.25 9.18 -6.16 -0.25 8.89 -4.95 -0.25 8.2 -4.87 -0.25 8.62
  [4,7,-6.03,-0.25,9.18,-6.16,-0.25,8.89,-4.95,-0.25,8.2,-4.87,-0.25,8.62],
// 4 7 -5.81 -0.25 9.36 -6.03 -0.25 9.18 -4.87 -0.25 8.62 -4.91 -0.25 8.95
  [4,7,-5.81,-0.25,9.36,-6.03,-0.25,9.18,-4.87,-0.25,8.62,-4.91,-0.25,8.95],
// 4 7 -5.51 -0.25 9.41 -5.81 -0.25 9.36 -4.91 -0.25 8.95 -5.04 -0.25 9.2
  [4,7,-5.51,-0.25,9.41,-5.81,-0.25,9.36,-4.91,-0.25,8.95,-5.04,-0.25,9.2],
// 3 7 -5.51 -0.25 9.41 -5.04 -0.25 9.2 -5.24 -0.25 9.36
  [3,7,-5.51,-0.25,9.41,-5.04,-0.25,9.2,-5.24,-0.25,9.36],
// 4 7 -7.19 -0.25 8.1 -6.54 -0.25 8.48 -6.54 -0.25 8.55 -7.23 -0.25 8.55
  [4,7,-7.19,-0.25,8.1,-6.54,-0.25,8.48,-6.54,-0.25,8.55,-7.23,-0.25,8.55],
// 4 7 -7.23 -0.25 8.55 -6.54 -0.25 8.55 -6.48 -0.25 9.04 -7.29 -0.25 8.9
  [4,7,-7.23,-0.25,8.55,-6.54,-0.25,8.55,-6.48,-0.25,9.04,-7.29,-0.25,8.9],
// 4 7 -7.38 -0.25 9.16 -7.29 -0.25 8.9 -6.48 -0.25 9.04 -6.28 -0.25 9.42
  [4,7,-7.38,-0.25,9.16,-7.29,-0.25,8.9,-6.48,-0.25,9.04,-6.28,-0.25,9.42],
// 4 7 -7.54 -0.25 9.41 -7.38 -0.25 9.16 -6.28 -0.25 9.42 -5.96 -0.25 9.66
  [4,7,-7.54,-0.25,9.41,-7.38,-0.25,9.16,-6.28,-0.25,9.42,-5.96,-0.25,9.66],
// 4 7 -7.74 -0.25 9.59 -7.54 -0.25 9.41 -5.96 -0.25 9.66 -5.55 -0.25 9.74
  [4,7,-7.74,-0.25,9.59,-7.54,-0.25,9.41,-5.96,-0.25,9.66,-5.55,-0.25,9.74],
// 3 7 -5.55 -0.25 9.74 -7.98 -0.25 9.7 -7.74 -0.25 9.59
  [3,7,-5.55,-0.25,9.74,-7.98,-0.25,9.7,-7.74,-0.25,9.59],
// 3 7 -5.55 -0.25 9.74 -8.25 -0.25 9.74 -7.98 -0.25 9.7
  [3,7,-5.55,-0.25,9.74,-8.25,-0.25,9.74,-7.98,-0.25,9.7],
// 3 7 -4.54 -0.25 8.22 -4.64 -0.25 7.9 -4.5 -0.25 5.77
  [3,7,-4.54,-0.25,8.22,-4.64,-0.25,7.9,-4.5,-0.25,5.77],
// 3 7 -4.64 -0.25 7.9 -4.86 -0.25 7.55 -4.5 -0.25 5.77
  [3,7,-4.64,-0.25,7.9,-4.86,-0.25,7.55,-4.5,-0.25,5.77],
// 3 7 -4.86 -0.25 7.55 -5.25 -0.25 7.14 -4.5 -0.25 5.77
  [3,7,-4.86,-0.25,7.55,-5.25,-0.25,7.14,-4.5,-0.25,5.77],
// 3 7 -5.25 -0.25 7.14 -5.36 -0.25 7.03 -4.5 -0.25 5.77
  [3,7,-5.25,-0.25,7.14,-5.36,-0.25,7.03,-4.5,-0.25,5.77],
// 4 7 -4.5 -0.25 5.77 -5.36 -0.25 7.03 -5.8 -0.25 6.59 -6.05 -0.25 6.27
  [4,7,-4.5,-0.25,5.77,-5.36,-0.25,7.03,-5.8,-0.25,6.59,-6.05,-0.25,6.27],
// 4 7 -4.5 -0.25 5.77 -6.05 -0.25 6.27 -6.18 -0.25 6.02 -6.22 -0.25 5.77
  [4,7,-4.5,-0.25,5.77,-6.05,-0.25,6.27,-6.18,-0.25,6.02,-6.22,-0.25,5.77],
// 3 7 -8.25 -0.25 9.74 -10.65 -0.25 9.66 -8.52 -0.25 9.7
  [3,7,-8.25,-0.25,9.74,-10.65,-0.25,9.66,-8.52,-0.25,9.7],
];
module ldraw_lib__163156b(step=0, col=false, unit=2/5, alt=false, line=0.2, solid=!$preview)
    makepoly(ldraw_lib__163156b(), step=step, col=col, unit=unit, alt=alt, line=line, solid=solid);
ldraw_lib__163156b(line=0.2);
